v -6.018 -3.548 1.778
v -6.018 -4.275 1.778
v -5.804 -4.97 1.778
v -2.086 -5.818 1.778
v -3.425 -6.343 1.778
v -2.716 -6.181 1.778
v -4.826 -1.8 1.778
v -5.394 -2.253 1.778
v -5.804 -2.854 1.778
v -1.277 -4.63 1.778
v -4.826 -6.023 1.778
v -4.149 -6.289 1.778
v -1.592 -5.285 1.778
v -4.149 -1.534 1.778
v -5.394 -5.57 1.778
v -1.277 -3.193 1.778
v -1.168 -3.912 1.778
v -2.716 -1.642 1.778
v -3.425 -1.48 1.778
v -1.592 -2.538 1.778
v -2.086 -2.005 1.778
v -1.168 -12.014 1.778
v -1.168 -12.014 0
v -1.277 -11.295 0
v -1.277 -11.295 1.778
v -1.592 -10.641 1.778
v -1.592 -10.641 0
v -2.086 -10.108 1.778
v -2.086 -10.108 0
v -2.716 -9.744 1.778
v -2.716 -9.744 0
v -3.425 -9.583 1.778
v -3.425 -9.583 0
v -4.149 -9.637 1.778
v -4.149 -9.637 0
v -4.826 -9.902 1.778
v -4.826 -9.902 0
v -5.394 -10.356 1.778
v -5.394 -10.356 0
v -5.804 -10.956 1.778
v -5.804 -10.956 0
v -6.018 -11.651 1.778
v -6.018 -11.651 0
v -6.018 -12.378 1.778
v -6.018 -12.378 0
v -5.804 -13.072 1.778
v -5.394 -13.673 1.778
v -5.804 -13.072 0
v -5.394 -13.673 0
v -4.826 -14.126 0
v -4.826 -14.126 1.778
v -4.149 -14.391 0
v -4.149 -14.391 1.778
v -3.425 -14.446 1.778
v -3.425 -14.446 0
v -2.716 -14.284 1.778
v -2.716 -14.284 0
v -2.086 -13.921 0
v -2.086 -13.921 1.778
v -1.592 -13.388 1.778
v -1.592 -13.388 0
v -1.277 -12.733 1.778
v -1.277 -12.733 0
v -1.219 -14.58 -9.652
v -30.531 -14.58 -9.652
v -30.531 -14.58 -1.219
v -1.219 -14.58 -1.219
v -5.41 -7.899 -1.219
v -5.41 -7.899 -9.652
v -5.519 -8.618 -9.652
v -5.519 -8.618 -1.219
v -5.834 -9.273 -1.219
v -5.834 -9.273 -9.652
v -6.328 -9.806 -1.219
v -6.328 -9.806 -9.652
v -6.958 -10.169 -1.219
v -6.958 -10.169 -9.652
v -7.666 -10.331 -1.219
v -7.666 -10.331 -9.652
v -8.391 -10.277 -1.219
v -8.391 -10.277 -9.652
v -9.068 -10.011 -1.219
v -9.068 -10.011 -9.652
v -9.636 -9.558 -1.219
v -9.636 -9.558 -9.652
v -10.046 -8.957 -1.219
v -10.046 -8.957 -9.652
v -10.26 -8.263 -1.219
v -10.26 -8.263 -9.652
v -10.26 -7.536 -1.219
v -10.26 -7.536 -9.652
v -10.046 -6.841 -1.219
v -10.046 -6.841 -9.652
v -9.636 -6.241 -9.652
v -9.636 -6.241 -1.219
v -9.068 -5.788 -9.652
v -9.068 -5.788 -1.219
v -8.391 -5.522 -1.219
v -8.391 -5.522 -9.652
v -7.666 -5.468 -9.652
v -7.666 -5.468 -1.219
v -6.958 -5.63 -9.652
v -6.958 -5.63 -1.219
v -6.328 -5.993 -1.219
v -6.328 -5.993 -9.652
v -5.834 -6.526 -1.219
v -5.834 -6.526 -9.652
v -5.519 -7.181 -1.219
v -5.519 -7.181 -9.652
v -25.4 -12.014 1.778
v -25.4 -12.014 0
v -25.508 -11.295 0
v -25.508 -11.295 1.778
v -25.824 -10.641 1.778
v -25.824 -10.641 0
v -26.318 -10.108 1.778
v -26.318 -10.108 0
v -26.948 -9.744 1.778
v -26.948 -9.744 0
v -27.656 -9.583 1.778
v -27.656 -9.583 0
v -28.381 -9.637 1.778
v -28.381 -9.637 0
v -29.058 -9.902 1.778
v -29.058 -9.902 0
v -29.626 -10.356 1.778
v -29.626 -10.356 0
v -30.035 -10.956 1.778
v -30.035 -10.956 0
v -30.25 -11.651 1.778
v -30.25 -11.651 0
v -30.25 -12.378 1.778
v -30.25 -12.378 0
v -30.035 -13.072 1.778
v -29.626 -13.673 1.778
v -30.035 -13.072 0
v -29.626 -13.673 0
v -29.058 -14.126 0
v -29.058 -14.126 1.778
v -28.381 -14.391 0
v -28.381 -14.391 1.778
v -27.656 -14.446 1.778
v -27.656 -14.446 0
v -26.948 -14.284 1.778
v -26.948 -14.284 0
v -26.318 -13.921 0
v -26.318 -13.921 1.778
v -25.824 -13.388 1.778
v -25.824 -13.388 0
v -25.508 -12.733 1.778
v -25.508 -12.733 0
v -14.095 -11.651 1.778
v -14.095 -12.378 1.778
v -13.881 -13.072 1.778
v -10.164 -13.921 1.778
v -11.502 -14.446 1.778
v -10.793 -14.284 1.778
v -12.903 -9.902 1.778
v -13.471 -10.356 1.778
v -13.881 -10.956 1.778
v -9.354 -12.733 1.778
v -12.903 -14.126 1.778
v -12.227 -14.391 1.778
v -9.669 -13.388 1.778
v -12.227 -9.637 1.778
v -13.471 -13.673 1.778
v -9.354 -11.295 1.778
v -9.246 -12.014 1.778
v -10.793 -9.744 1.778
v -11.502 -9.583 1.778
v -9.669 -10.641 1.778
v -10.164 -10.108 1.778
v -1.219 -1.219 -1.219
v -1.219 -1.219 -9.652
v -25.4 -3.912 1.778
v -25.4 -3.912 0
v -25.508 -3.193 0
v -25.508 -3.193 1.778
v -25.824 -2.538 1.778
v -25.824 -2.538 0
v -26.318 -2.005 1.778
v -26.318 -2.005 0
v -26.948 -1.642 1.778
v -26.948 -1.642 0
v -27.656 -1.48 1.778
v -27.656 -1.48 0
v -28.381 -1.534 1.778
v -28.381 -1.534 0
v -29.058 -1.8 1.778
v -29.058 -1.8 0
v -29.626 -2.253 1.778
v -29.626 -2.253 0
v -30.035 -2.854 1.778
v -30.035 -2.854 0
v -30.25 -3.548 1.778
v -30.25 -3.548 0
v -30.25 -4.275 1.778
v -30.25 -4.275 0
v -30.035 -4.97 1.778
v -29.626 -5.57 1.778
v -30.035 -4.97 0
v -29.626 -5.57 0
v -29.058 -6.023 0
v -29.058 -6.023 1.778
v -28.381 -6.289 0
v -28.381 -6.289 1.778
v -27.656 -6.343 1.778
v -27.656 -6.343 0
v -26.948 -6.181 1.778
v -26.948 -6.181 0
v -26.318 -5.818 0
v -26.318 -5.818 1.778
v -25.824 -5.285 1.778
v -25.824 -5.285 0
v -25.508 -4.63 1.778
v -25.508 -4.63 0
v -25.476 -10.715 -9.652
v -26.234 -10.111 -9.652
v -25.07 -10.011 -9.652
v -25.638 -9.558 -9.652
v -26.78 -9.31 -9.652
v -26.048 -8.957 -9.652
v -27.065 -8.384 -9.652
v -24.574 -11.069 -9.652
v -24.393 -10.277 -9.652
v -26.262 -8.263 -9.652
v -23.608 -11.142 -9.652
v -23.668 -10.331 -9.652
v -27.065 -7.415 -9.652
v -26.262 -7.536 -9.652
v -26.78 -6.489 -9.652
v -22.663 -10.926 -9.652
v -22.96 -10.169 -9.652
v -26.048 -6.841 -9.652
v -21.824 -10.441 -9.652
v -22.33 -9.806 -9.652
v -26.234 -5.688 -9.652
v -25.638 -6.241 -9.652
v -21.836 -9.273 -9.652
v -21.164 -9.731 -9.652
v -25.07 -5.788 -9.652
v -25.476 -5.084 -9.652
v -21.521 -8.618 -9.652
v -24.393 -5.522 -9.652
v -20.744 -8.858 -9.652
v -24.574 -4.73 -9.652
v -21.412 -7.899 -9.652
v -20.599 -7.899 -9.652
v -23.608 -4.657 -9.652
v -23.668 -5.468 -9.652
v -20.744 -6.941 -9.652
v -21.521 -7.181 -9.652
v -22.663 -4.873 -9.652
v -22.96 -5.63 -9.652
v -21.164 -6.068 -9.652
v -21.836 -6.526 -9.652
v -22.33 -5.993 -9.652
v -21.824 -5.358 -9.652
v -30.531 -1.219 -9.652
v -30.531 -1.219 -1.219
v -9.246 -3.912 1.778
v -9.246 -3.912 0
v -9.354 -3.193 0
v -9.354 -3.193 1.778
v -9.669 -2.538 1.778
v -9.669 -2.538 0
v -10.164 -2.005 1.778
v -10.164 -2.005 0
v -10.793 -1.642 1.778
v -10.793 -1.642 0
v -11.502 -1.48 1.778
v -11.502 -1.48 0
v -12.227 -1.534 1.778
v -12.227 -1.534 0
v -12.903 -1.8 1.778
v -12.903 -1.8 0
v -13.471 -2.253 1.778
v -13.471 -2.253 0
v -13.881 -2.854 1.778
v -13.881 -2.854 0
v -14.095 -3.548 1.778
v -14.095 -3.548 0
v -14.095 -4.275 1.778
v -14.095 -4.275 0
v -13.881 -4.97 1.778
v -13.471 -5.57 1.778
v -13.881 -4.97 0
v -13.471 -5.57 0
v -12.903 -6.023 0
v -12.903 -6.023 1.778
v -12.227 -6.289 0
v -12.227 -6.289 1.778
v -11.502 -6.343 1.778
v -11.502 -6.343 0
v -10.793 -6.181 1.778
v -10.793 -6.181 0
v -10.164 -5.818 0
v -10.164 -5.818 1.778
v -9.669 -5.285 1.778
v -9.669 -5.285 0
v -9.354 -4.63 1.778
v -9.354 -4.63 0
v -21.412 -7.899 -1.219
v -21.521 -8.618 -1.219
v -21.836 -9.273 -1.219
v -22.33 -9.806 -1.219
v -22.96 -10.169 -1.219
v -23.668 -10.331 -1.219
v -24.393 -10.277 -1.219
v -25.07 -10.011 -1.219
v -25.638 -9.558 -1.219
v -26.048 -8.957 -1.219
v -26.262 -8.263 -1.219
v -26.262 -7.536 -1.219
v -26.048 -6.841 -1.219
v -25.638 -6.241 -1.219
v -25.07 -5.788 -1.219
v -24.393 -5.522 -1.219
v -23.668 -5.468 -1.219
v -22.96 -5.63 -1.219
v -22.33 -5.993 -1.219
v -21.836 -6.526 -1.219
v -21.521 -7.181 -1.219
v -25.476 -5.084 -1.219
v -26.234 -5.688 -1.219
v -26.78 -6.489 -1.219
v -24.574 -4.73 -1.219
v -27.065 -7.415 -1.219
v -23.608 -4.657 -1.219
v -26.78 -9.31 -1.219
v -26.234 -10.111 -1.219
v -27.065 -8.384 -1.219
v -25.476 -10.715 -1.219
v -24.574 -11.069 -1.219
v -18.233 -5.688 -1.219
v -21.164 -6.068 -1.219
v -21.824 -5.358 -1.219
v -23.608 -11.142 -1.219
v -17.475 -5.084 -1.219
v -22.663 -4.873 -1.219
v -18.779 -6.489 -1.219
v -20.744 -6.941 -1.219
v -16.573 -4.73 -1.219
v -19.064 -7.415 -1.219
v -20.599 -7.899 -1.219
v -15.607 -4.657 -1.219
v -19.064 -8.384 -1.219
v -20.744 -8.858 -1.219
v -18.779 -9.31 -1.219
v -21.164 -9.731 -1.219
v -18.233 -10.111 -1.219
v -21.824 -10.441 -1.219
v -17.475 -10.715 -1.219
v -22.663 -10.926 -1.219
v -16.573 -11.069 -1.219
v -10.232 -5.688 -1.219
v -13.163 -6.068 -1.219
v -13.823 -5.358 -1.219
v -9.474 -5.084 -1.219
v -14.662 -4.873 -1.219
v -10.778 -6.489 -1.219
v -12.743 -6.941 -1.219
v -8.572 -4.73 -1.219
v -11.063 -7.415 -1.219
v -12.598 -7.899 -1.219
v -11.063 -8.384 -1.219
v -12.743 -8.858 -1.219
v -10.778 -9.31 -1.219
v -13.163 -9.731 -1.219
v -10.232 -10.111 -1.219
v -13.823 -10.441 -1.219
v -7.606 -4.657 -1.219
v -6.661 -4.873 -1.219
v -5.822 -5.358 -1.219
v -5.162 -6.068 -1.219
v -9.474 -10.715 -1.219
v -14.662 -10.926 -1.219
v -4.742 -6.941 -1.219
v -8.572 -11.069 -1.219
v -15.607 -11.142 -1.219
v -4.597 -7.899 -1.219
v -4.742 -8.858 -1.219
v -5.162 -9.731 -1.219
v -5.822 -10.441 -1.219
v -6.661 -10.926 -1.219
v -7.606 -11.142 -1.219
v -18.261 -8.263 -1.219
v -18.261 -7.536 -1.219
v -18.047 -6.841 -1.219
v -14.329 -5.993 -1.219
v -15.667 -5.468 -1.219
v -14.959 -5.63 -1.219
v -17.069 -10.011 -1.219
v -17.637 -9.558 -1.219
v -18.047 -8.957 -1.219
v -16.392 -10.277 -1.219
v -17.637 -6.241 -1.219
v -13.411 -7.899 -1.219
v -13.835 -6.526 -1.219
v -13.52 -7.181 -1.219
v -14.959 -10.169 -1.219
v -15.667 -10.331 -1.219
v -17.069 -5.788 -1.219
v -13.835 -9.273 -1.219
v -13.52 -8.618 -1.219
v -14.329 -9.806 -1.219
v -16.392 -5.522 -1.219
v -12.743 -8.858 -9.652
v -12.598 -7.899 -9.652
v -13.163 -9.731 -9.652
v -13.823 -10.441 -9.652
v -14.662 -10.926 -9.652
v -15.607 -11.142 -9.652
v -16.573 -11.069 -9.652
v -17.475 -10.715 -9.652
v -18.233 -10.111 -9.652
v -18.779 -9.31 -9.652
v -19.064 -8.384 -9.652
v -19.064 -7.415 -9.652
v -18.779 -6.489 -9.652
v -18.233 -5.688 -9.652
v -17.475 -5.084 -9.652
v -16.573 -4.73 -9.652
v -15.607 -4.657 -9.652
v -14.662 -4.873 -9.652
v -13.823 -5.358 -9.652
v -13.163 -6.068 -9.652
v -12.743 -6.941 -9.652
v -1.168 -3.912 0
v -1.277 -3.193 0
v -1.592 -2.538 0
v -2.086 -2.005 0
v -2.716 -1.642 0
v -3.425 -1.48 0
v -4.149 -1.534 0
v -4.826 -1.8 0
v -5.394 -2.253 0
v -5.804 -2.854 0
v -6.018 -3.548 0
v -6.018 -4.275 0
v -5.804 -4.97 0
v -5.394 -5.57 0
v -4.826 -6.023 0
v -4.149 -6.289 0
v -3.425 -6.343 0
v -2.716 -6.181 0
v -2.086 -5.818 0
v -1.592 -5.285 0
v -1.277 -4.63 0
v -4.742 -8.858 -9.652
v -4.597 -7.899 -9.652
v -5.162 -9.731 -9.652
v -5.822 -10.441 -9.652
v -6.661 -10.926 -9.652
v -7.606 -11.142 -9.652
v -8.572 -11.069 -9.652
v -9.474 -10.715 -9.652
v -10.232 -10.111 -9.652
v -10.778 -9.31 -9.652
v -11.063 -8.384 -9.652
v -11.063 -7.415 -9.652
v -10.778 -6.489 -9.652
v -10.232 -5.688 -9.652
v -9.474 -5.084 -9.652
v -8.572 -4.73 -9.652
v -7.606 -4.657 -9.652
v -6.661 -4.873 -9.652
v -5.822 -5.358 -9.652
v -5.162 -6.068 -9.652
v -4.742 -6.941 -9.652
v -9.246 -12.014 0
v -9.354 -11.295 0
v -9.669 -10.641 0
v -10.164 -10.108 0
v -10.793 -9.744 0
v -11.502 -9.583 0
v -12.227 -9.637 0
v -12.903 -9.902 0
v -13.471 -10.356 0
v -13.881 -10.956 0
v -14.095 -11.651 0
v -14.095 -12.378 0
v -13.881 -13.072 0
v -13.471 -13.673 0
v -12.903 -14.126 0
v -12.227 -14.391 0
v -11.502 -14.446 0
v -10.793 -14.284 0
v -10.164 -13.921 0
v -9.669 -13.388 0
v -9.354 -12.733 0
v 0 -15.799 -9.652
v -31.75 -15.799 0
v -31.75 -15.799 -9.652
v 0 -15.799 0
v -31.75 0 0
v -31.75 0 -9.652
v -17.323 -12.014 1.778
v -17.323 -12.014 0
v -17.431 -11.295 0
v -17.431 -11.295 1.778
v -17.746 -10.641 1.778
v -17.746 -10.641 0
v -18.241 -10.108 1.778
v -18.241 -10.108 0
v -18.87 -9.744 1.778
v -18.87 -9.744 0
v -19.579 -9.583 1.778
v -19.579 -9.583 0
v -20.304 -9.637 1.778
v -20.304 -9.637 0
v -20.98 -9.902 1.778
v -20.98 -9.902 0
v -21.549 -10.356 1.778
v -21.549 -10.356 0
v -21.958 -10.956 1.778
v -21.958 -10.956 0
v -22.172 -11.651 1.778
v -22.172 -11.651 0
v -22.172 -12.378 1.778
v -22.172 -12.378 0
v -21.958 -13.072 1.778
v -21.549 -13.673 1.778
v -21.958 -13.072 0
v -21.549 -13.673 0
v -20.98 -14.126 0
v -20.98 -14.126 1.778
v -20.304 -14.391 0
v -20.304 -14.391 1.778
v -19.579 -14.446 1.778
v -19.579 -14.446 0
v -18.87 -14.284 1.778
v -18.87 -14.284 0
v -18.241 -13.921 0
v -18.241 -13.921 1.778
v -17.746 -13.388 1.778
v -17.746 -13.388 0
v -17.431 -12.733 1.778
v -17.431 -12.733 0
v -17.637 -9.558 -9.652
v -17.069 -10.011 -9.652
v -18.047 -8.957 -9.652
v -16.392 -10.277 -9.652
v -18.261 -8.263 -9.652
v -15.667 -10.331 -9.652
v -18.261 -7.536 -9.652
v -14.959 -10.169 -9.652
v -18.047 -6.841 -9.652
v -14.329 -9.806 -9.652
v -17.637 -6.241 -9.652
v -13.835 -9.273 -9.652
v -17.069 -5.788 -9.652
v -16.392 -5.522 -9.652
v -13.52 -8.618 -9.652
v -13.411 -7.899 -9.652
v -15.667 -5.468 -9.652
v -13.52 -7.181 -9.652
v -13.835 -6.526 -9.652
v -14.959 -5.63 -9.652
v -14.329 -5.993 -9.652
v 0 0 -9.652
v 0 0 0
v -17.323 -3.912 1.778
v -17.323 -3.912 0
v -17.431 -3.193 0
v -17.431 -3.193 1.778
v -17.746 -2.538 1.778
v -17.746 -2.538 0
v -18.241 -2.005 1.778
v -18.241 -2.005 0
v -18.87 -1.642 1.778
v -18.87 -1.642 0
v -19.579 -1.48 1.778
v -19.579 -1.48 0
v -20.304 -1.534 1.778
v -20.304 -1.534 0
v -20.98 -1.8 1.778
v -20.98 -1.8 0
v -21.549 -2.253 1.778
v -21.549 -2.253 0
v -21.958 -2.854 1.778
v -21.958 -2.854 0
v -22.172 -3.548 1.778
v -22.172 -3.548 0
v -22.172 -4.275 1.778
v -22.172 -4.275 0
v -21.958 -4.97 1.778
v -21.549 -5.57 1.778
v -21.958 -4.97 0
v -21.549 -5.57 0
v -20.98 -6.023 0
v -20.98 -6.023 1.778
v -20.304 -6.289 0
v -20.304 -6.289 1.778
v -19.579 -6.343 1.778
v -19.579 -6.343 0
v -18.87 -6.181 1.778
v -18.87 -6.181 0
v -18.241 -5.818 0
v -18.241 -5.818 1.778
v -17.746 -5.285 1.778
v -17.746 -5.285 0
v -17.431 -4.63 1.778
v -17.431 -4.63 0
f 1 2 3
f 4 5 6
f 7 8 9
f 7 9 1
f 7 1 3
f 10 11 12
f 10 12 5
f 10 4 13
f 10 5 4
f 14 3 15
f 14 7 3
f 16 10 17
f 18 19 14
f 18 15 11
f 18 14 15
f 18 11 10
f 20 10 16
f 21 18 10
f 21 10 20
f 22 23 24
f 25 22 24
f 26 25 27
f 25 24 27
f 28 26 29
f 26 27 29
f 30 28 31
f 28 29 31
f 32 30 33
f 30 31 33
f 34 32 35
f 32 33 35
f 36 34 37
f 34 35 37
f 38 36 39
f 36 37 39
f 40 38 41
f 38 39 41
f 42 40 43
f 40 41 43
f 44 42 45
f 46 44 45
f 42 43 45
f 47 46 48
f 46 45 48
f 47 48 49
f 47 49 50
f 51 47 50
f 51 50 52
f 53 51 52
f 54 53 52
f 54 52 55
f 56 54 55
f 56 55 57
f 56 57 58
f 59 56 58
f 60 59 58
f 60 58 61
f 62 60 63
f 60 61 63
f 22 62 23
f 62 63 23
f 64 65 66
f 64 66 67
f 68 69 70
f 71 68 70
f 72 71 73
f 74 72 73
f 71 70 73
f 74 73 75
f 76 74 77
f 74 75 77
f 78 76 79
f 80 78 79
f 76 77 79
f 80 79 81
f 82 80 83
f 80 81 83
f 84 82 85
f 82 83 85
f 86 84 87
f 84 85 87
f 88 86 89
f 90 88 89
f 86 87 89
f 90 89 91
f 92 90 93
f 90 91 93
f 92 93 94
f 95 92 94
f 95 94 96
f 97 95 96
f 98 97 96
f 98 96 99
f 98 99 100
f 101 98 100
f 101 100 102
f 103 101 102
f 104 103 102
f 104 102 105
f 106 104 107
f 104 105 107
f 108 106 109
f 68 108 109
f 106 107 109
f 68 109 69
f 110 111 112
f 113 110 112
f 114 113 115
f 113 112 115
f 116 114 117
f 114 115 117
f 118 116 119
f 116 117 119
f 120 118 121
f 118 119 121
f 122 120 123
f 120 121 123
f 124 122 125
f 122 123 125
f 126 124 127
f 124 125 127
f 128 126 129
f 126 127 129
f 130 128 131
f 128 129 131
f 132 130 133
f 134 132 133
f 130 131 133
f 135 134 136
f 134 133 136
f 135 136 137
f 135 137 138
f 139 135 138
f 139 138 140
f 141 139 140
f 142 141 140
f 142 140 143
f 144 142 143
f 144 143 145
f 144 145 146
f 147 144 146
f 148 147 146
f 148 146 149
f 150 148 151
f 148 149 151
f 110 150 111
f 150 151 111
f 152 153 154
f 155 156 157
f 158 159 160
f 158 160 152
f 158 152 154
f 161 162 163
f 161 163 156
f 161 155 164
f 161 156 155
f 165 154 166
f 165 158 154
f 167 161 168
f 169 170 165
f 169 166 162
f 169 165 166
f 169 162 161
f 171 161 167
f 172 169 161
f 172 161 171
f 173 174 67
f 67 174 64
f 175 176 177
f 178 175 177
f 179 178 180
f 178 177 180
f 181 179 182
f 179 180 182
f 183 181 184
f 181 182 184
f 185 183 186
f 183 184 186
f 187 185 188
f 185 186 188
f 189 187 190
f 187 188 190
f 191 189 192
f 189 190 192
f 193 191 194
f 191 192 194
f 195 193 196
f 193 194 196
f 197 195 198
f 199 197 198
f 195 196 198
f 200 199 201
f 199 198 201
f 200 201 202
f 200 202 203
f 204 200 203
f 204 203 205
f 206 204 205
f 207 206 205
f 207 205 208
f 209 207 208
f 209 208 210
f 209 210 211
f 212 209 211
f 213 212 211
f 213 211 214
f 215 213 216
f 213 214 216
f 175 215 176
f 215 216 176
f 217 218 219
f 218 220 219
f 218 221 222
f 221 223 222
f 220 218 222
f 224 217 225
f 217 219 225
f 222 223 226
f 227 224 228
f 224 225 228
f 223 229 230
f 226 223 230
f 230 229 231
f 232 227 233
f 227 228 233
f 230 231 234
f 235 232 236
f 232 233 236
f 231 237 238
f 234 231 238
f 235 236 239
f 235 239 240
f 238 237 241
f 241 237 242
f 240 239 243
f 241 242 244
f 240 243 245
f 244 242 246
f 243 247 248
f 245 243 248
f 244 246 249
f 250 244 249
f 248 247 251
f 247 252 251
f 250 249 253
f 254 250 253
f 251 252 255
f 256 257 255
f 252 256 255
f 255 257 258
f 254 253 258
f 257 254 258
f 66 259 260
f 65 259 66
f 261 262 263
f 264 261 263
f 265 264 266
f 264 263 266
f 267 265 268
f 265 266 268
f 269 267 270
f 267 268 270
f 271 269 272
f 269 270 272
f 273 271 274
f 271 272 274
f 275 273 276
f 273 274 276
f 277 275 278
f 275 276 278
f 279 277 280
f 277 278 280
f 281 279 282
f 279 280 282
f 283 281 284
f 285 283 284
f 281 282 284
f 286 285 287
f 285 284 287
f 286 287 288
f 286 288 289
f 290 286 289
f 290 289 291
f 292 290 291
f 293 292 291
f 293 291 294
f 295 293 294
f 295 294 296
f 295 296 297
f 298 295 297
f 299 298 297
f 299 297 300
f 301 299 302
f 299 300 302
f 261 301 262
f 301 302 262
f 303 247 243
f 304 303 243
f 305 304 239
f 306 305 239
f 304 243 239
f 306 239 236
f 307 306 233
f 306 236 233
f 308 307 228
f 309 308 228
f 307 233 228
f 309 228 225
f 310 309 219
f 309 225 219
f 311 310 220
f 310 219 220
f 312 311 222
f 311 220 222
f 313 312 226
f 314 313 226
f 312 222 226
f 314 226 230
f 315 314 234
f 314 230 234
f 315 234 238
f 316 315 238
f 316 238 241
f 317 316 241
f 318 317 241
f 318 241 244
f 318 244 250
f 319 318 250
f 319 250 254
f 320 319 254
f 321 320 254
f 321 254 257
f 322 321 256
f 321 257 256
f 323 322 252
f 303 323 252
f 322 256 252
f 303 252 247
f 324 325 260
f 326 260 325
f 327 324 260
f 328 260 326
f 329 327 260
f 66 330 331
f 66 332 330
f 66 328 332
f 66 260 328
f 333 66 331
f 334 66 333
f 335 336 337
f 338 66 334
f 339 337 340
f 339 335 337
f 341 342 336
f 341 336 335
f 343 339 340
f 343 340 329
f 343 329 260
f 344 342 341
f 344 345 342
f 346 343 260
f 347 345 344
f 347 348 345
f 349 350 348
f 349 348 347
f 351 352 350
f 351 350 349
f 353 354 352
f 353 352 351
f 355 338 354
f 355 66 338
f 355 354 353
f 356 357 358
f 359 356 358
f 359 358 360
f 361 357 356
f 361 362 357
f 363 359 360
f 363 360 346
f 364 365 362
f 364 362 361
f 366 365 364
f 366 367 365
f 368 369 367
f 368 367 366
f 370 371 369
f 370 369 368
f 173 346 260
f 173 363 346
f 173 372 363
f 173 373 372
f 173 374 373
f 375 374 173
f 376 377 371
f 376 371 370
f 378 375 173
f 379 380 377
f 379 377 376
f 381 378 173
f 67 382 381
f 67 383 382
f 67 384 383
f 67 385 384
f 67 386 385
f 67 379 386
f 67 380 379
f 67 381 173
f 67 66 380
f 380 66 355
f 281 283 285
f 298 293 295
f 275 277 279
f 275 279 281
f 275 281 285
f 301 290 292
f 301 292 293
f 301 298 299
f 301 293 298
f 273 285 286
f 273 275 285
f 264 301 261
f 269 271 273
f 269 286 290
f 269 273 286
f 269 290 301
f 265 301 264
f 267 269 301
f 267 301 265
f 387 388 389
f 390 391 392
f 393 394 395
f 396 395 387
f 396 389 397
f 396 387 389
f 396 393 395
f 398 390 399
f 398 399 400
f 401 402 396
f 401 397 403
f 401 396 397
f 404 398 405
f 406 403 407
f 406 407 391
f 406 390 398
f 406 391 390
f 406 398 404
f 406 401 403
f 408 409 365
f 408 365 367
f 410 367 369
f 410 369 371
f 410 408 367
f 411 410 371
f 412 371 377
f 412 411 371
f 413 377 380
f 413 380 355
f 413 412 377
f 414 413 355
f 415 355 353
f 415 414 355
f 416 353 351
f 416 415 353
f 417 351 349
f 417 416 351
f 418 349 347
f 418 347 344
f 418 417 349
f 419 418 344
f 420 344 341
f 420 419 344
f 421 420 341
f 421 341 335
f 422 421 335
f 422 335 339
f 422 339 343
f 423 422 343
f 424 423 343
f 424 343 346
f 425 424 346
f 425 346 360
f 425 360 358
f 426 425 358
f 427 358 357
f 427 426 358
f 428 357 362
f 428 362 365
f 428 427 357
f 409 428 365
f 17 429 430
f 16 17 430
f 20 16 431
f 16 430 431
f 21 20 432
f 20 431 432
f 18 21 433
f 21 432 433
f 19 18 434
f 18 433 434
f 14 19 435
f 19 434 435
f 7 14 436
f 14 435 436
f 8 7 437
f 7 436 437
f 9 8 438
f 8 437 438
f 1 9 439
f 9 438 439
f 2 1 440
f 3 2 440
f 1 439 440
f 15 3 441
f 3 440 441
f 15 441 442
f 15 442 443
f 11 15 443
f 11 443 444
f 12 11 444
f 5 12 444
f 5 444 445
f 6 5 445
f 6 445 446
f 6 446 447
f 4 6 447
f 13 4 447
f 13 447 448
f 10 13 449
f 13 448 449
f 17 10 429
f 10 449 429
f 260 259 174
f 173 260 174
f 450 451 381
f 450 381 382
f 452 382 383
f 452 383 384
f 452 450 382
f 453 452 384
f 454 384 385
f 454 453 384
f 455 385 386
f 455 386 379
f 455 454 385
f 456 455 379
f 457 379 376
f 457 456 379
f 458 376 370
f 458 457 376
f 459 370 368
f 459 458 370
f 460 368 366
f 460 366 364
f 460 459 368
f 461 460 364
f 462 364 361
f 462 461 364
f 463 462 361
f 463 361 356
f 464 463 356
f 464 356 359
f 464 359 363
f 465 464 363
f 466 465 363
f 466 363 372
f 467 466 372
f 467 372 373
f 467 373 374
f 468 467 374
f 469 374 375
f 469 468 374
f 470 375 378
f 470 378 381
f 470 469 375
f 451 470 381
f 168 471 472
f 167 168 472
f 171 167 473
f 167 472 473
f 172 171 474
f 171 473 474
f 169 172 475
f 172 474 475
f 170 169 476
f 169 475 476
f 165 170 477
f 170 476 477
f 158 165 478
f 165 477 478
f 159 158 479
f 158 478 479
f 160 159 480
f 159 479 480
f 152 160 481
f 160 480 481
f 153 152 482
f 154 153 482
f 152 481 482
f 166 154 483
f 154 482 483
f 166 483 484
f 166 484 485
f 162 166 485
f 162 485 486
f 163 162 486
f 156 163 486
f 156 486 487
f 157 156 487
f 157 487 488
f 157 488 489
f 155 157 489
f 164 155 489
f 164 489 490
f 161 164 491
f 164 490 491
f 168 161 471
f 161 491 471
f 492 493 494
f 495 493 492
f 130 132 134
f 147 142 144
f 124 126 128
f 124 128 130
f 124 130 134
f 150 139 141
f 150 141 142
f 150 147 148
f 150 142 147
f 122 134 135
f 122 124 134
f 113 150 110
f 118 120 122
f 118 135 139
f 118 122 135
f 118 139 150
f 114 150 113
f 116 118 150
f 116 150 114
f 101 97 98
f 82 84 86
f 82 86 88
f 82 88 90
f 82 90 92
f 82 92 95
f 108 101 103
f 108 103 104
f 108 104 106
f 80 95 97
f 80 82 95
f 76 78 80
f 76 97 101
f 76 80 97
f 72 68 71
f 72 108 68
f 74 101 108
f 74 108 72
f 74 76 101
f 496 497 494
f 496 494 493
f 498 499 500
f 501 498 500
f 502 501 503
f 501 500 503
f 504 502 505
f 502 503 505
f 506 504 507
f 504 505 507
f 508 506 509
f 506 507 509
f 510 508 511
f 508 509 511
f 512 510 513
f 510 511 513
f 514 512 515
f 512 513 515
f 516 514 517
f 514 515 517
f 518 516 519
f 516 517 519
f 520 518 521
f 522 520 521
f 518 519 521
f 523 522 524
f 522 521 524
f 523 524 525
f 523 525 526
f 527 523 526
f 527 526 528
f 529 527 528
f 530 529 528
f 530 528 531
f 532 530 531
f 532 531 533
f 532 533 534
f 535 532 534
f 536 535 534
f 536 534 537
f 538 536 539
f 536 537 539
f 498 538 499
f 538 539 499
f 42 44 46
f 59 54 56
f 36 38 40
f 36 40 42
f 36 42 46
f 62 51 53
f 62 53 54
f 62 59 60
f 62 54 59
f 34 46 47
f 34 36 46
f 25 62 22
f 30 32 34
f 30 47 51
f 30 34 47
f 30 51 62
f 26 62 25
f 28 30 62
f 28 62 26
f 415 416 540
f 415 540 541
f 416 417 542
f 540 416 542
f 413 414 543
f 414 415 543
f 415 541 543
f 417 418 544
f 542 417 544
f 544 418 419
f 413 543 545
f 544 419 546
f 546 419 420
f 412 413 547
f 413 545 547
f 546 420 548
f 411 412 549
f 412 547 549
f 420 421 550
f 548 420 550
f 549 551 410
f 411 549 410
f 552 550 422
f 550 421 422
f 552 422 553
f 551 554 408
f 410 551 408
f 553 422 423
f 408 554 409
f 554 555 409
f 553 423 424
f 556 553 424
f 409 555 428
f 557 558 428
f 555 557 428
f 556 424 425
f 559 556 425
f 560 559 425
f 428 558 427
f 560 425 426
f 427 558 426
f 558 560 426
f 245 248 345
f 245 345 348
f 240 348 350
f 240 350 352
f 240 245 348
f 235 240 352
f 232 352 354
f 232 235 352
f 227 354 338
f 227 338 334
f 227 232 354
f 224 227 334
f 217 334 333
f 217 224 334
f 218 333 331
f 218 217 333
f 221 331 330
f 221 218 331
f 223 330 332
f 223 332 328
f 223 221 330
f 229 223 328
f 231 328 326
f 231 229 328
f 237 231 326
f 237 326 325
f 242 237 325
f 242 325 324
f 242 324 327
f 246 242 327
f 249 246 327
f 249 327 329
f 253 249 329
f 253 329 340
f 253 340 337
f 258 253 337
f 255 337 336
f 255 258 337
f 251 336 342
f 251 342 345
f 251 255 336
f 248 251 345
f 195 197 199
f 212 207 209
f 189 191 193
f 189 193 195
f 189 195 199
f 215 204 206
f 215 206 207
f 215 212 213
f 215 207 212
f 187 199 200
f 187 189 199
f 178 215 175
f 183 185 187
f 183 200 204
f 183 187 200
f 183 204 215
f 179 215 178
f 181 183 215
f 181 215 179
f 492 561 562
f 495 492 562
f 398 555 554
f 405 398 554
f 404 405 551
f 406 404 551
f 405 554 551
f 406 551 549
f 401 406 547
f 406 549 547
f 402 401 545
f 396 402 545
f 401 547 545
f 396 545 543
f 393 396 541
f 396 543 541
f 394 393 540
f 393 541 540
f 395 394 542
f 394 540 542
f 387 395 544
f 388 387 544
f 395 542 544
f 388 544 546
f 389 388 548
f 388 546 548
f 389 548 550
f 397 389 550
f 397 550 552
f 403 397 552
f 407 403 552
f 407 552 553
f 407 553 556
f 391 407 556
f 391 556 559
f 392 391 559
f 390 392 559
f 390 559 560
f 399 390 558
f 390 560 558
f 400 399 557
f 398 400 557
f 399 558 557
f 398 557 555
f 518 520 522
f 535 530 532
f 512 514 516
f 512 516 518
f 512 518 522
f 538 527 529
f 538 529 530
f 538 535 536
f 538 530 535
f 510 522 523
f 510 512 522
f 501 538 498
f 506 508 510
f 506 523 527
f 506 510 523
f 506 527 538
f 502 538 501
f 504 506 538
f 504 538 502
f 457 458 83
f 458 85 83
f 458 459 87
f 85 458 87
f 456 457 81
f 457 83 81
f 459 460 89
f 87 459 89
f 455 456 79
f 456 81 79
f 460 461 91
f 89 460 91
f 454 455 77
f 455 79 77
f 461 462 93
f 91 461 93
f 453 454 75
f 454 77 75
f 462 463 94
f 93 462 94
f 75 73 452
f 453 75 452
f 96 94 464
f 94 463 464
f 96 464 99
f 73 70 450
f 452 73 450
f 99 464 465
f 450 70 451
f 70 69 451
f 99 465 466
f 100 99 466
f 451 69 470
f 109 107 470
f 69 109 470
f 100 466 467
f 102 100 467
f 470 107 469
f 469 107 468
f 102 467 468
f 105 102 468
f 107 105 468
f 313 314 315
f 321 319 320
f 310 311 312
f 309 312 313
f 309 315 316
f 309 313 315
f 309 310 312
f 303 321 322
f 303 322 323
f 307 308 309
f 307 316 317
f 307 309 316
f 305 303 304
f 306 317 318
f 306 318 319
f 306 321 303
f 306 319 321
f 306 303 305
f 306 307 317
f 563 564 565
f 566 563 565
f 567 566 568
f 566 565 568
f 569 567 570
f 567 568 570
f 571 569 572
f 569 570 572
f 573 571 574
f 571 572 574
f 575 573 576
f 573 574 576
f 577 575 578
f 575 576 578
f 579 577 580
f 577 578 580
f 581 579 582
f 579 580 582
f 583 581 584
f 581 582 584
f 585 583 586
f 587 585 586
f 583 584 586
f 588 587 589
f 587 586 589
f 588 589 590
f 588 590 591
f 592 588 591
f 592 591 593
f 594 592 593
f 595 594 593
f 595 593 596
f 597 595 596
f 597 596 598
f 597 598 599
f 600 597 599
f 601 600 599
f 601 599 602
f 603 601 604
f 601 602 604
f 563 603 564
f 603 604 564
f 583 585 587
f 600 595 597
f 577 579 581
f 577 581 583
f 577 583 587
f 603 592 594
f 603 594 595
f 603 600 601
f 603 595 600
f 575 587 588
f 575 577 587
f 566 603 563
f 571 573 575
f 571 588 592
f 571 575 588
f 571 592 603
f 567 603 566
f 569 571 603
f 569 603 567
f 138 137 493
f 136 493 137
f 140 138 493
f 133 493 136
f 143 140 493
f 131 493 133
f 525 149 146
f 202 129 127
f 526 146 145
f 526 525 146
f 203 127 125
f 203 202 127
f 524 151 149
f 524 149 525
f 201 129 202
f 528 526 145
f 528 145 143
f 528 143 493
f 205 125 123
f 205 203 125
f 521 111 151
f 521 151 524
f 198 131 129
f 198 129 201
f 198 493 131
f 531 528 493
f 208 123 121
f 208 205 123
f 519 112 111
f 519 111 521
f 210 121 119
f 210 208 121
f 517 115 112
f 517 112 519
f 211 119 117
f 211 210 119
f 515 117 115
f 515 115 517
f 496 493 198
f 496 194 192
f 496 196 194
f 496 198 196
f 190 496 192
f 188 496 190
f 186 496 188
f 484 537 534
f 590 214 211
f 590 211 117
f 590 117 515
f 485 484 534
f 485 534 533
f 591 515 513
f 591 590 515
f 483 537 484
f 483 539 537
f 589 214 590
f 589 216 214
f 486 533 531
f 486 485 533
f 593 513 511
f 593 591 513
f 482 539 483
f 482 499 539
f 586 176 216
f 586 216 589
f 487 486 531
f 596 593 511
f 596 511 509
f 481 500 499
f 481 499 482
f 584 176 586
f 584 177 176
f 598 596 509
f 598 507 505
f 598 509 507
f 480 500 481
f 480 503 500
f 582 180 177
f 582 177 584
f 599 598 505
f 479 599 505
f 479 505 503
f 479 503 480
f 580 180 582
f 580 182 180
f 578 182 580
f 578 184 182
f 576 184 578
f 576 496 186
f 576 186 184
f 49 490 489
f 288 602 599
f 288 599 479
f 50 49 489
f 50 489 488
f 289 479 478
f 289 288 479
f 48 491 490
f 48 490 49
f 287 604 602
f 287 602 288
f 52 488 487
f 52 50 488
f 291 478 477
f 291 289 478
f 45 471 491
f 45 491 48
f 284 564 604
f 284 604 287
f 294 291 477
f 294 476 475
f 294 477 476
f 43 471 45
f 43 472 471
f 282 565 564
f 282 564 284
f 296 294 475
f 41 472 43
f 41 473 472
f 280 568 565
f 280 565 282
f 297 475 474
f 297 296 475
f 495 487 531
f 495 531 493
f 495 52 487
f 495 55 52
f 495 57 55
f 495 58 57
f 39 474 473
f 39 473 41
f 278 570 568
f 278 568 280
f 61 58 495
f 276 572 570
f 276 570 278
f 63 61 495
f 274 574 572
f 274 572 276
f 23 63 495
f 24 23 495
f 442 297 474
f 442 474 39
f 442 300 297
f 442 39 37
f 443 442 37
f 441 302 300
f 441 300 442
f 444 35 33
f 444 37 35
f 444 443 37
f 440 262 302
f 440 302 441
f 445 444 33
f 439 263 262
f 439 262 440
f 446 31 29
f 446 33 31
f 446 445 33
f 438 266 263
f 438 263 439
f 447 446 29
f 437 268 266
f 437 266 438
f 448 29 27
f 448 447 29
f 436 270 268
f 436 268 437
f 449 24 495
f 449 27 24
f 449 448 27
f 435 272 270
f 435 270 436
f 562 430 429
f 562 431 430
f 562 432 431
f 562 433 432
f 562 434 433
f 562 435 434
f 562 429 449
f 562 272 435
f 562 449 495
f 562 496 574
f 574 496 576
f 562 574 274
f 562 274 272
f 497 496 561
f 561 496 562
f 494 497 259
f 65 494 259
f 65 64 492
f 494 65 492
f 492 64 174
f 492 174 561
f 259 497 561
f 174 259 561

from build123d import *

# Parameters (mm, degrees)
F0_W     = 31.75
F0_H     = 9.652
F1_DEPTH = 15.7988
F2_R     = 2.4384
F3_DEPTH = 1.778
F4_W     = 29.3116
F4_H     = 13.3604
F4_R     = 3.2512
F4_R_2   = 2.4384
F5_DEPTH = 8.4328


with BuildPart() as f1:
    # F0 (on Front) → F1 (new body)
    with BuildSketch(Plane.XZ):
        with Locations((-15.875, -4.826)):
            Rectangle(F0_W, F0_H)
    extrude(amount=F1_DEPTH)

    # F2 (on face) → F3 (join)
    with BuildSketch(Plane.XY):
        with Locations((-27.8384, -3.9116)):
            Circle(F2_R)
        with Locations((-19.7612, -3.9116)):
            Circle(F2_R)
        with Locations((-11.684, -3.9116)):
            Circle(F2_R)
        with Locations((-3.6068, -3.9116)):
            Circle(F2_R)
        with Locations((-3.6068, -12.0142)):
            Circle(F2_R)
        with Locations((-11.684, -12.0142)):
            Circle(F2_R)
        with Locations((-19.7612, -12.0142)):
            Circle(F2_R)
        with Locations((-27.8384, -12.0142)):
            Circle(F2_R)
    extrude(amount=F3_DEPTH)

    # F4 (on face) → F5 (cut)
    with BuildSketch(Plane(origin=(0, 0, -9.652), x_dir=(1, 0, 0), z_dir=(0, 0, -1))):
        with Locations((-15.875, 7.8994)):
            Rectangle(F4_W, F4_H)
        with Locations((-23.8506, 7.8994)):
            Circle(F4_R, mode=Mode.SUBTRACT)
        with Locations((-15.8496, 7.8994)):
            Circle(F4_R, mode=Mode.SUBTRACT)
        with Locations((-7.8486, 7.8994)):
            Circle(F4_R, mode=Mode.SUBTRACT)
        with Locations((-23.8506, 7.8994)):
            Circle(F4_R_2)
        with Locations((-15.8496, 7.8994)):
            Circle(F4_R_2)
        with Locations((-7.8486, 7.8994)):
            Circle(F4_R_2)
    extrude(amount=-F5_DEPTH, mode=Mode.SUBTRACT)


solid = f1.part
